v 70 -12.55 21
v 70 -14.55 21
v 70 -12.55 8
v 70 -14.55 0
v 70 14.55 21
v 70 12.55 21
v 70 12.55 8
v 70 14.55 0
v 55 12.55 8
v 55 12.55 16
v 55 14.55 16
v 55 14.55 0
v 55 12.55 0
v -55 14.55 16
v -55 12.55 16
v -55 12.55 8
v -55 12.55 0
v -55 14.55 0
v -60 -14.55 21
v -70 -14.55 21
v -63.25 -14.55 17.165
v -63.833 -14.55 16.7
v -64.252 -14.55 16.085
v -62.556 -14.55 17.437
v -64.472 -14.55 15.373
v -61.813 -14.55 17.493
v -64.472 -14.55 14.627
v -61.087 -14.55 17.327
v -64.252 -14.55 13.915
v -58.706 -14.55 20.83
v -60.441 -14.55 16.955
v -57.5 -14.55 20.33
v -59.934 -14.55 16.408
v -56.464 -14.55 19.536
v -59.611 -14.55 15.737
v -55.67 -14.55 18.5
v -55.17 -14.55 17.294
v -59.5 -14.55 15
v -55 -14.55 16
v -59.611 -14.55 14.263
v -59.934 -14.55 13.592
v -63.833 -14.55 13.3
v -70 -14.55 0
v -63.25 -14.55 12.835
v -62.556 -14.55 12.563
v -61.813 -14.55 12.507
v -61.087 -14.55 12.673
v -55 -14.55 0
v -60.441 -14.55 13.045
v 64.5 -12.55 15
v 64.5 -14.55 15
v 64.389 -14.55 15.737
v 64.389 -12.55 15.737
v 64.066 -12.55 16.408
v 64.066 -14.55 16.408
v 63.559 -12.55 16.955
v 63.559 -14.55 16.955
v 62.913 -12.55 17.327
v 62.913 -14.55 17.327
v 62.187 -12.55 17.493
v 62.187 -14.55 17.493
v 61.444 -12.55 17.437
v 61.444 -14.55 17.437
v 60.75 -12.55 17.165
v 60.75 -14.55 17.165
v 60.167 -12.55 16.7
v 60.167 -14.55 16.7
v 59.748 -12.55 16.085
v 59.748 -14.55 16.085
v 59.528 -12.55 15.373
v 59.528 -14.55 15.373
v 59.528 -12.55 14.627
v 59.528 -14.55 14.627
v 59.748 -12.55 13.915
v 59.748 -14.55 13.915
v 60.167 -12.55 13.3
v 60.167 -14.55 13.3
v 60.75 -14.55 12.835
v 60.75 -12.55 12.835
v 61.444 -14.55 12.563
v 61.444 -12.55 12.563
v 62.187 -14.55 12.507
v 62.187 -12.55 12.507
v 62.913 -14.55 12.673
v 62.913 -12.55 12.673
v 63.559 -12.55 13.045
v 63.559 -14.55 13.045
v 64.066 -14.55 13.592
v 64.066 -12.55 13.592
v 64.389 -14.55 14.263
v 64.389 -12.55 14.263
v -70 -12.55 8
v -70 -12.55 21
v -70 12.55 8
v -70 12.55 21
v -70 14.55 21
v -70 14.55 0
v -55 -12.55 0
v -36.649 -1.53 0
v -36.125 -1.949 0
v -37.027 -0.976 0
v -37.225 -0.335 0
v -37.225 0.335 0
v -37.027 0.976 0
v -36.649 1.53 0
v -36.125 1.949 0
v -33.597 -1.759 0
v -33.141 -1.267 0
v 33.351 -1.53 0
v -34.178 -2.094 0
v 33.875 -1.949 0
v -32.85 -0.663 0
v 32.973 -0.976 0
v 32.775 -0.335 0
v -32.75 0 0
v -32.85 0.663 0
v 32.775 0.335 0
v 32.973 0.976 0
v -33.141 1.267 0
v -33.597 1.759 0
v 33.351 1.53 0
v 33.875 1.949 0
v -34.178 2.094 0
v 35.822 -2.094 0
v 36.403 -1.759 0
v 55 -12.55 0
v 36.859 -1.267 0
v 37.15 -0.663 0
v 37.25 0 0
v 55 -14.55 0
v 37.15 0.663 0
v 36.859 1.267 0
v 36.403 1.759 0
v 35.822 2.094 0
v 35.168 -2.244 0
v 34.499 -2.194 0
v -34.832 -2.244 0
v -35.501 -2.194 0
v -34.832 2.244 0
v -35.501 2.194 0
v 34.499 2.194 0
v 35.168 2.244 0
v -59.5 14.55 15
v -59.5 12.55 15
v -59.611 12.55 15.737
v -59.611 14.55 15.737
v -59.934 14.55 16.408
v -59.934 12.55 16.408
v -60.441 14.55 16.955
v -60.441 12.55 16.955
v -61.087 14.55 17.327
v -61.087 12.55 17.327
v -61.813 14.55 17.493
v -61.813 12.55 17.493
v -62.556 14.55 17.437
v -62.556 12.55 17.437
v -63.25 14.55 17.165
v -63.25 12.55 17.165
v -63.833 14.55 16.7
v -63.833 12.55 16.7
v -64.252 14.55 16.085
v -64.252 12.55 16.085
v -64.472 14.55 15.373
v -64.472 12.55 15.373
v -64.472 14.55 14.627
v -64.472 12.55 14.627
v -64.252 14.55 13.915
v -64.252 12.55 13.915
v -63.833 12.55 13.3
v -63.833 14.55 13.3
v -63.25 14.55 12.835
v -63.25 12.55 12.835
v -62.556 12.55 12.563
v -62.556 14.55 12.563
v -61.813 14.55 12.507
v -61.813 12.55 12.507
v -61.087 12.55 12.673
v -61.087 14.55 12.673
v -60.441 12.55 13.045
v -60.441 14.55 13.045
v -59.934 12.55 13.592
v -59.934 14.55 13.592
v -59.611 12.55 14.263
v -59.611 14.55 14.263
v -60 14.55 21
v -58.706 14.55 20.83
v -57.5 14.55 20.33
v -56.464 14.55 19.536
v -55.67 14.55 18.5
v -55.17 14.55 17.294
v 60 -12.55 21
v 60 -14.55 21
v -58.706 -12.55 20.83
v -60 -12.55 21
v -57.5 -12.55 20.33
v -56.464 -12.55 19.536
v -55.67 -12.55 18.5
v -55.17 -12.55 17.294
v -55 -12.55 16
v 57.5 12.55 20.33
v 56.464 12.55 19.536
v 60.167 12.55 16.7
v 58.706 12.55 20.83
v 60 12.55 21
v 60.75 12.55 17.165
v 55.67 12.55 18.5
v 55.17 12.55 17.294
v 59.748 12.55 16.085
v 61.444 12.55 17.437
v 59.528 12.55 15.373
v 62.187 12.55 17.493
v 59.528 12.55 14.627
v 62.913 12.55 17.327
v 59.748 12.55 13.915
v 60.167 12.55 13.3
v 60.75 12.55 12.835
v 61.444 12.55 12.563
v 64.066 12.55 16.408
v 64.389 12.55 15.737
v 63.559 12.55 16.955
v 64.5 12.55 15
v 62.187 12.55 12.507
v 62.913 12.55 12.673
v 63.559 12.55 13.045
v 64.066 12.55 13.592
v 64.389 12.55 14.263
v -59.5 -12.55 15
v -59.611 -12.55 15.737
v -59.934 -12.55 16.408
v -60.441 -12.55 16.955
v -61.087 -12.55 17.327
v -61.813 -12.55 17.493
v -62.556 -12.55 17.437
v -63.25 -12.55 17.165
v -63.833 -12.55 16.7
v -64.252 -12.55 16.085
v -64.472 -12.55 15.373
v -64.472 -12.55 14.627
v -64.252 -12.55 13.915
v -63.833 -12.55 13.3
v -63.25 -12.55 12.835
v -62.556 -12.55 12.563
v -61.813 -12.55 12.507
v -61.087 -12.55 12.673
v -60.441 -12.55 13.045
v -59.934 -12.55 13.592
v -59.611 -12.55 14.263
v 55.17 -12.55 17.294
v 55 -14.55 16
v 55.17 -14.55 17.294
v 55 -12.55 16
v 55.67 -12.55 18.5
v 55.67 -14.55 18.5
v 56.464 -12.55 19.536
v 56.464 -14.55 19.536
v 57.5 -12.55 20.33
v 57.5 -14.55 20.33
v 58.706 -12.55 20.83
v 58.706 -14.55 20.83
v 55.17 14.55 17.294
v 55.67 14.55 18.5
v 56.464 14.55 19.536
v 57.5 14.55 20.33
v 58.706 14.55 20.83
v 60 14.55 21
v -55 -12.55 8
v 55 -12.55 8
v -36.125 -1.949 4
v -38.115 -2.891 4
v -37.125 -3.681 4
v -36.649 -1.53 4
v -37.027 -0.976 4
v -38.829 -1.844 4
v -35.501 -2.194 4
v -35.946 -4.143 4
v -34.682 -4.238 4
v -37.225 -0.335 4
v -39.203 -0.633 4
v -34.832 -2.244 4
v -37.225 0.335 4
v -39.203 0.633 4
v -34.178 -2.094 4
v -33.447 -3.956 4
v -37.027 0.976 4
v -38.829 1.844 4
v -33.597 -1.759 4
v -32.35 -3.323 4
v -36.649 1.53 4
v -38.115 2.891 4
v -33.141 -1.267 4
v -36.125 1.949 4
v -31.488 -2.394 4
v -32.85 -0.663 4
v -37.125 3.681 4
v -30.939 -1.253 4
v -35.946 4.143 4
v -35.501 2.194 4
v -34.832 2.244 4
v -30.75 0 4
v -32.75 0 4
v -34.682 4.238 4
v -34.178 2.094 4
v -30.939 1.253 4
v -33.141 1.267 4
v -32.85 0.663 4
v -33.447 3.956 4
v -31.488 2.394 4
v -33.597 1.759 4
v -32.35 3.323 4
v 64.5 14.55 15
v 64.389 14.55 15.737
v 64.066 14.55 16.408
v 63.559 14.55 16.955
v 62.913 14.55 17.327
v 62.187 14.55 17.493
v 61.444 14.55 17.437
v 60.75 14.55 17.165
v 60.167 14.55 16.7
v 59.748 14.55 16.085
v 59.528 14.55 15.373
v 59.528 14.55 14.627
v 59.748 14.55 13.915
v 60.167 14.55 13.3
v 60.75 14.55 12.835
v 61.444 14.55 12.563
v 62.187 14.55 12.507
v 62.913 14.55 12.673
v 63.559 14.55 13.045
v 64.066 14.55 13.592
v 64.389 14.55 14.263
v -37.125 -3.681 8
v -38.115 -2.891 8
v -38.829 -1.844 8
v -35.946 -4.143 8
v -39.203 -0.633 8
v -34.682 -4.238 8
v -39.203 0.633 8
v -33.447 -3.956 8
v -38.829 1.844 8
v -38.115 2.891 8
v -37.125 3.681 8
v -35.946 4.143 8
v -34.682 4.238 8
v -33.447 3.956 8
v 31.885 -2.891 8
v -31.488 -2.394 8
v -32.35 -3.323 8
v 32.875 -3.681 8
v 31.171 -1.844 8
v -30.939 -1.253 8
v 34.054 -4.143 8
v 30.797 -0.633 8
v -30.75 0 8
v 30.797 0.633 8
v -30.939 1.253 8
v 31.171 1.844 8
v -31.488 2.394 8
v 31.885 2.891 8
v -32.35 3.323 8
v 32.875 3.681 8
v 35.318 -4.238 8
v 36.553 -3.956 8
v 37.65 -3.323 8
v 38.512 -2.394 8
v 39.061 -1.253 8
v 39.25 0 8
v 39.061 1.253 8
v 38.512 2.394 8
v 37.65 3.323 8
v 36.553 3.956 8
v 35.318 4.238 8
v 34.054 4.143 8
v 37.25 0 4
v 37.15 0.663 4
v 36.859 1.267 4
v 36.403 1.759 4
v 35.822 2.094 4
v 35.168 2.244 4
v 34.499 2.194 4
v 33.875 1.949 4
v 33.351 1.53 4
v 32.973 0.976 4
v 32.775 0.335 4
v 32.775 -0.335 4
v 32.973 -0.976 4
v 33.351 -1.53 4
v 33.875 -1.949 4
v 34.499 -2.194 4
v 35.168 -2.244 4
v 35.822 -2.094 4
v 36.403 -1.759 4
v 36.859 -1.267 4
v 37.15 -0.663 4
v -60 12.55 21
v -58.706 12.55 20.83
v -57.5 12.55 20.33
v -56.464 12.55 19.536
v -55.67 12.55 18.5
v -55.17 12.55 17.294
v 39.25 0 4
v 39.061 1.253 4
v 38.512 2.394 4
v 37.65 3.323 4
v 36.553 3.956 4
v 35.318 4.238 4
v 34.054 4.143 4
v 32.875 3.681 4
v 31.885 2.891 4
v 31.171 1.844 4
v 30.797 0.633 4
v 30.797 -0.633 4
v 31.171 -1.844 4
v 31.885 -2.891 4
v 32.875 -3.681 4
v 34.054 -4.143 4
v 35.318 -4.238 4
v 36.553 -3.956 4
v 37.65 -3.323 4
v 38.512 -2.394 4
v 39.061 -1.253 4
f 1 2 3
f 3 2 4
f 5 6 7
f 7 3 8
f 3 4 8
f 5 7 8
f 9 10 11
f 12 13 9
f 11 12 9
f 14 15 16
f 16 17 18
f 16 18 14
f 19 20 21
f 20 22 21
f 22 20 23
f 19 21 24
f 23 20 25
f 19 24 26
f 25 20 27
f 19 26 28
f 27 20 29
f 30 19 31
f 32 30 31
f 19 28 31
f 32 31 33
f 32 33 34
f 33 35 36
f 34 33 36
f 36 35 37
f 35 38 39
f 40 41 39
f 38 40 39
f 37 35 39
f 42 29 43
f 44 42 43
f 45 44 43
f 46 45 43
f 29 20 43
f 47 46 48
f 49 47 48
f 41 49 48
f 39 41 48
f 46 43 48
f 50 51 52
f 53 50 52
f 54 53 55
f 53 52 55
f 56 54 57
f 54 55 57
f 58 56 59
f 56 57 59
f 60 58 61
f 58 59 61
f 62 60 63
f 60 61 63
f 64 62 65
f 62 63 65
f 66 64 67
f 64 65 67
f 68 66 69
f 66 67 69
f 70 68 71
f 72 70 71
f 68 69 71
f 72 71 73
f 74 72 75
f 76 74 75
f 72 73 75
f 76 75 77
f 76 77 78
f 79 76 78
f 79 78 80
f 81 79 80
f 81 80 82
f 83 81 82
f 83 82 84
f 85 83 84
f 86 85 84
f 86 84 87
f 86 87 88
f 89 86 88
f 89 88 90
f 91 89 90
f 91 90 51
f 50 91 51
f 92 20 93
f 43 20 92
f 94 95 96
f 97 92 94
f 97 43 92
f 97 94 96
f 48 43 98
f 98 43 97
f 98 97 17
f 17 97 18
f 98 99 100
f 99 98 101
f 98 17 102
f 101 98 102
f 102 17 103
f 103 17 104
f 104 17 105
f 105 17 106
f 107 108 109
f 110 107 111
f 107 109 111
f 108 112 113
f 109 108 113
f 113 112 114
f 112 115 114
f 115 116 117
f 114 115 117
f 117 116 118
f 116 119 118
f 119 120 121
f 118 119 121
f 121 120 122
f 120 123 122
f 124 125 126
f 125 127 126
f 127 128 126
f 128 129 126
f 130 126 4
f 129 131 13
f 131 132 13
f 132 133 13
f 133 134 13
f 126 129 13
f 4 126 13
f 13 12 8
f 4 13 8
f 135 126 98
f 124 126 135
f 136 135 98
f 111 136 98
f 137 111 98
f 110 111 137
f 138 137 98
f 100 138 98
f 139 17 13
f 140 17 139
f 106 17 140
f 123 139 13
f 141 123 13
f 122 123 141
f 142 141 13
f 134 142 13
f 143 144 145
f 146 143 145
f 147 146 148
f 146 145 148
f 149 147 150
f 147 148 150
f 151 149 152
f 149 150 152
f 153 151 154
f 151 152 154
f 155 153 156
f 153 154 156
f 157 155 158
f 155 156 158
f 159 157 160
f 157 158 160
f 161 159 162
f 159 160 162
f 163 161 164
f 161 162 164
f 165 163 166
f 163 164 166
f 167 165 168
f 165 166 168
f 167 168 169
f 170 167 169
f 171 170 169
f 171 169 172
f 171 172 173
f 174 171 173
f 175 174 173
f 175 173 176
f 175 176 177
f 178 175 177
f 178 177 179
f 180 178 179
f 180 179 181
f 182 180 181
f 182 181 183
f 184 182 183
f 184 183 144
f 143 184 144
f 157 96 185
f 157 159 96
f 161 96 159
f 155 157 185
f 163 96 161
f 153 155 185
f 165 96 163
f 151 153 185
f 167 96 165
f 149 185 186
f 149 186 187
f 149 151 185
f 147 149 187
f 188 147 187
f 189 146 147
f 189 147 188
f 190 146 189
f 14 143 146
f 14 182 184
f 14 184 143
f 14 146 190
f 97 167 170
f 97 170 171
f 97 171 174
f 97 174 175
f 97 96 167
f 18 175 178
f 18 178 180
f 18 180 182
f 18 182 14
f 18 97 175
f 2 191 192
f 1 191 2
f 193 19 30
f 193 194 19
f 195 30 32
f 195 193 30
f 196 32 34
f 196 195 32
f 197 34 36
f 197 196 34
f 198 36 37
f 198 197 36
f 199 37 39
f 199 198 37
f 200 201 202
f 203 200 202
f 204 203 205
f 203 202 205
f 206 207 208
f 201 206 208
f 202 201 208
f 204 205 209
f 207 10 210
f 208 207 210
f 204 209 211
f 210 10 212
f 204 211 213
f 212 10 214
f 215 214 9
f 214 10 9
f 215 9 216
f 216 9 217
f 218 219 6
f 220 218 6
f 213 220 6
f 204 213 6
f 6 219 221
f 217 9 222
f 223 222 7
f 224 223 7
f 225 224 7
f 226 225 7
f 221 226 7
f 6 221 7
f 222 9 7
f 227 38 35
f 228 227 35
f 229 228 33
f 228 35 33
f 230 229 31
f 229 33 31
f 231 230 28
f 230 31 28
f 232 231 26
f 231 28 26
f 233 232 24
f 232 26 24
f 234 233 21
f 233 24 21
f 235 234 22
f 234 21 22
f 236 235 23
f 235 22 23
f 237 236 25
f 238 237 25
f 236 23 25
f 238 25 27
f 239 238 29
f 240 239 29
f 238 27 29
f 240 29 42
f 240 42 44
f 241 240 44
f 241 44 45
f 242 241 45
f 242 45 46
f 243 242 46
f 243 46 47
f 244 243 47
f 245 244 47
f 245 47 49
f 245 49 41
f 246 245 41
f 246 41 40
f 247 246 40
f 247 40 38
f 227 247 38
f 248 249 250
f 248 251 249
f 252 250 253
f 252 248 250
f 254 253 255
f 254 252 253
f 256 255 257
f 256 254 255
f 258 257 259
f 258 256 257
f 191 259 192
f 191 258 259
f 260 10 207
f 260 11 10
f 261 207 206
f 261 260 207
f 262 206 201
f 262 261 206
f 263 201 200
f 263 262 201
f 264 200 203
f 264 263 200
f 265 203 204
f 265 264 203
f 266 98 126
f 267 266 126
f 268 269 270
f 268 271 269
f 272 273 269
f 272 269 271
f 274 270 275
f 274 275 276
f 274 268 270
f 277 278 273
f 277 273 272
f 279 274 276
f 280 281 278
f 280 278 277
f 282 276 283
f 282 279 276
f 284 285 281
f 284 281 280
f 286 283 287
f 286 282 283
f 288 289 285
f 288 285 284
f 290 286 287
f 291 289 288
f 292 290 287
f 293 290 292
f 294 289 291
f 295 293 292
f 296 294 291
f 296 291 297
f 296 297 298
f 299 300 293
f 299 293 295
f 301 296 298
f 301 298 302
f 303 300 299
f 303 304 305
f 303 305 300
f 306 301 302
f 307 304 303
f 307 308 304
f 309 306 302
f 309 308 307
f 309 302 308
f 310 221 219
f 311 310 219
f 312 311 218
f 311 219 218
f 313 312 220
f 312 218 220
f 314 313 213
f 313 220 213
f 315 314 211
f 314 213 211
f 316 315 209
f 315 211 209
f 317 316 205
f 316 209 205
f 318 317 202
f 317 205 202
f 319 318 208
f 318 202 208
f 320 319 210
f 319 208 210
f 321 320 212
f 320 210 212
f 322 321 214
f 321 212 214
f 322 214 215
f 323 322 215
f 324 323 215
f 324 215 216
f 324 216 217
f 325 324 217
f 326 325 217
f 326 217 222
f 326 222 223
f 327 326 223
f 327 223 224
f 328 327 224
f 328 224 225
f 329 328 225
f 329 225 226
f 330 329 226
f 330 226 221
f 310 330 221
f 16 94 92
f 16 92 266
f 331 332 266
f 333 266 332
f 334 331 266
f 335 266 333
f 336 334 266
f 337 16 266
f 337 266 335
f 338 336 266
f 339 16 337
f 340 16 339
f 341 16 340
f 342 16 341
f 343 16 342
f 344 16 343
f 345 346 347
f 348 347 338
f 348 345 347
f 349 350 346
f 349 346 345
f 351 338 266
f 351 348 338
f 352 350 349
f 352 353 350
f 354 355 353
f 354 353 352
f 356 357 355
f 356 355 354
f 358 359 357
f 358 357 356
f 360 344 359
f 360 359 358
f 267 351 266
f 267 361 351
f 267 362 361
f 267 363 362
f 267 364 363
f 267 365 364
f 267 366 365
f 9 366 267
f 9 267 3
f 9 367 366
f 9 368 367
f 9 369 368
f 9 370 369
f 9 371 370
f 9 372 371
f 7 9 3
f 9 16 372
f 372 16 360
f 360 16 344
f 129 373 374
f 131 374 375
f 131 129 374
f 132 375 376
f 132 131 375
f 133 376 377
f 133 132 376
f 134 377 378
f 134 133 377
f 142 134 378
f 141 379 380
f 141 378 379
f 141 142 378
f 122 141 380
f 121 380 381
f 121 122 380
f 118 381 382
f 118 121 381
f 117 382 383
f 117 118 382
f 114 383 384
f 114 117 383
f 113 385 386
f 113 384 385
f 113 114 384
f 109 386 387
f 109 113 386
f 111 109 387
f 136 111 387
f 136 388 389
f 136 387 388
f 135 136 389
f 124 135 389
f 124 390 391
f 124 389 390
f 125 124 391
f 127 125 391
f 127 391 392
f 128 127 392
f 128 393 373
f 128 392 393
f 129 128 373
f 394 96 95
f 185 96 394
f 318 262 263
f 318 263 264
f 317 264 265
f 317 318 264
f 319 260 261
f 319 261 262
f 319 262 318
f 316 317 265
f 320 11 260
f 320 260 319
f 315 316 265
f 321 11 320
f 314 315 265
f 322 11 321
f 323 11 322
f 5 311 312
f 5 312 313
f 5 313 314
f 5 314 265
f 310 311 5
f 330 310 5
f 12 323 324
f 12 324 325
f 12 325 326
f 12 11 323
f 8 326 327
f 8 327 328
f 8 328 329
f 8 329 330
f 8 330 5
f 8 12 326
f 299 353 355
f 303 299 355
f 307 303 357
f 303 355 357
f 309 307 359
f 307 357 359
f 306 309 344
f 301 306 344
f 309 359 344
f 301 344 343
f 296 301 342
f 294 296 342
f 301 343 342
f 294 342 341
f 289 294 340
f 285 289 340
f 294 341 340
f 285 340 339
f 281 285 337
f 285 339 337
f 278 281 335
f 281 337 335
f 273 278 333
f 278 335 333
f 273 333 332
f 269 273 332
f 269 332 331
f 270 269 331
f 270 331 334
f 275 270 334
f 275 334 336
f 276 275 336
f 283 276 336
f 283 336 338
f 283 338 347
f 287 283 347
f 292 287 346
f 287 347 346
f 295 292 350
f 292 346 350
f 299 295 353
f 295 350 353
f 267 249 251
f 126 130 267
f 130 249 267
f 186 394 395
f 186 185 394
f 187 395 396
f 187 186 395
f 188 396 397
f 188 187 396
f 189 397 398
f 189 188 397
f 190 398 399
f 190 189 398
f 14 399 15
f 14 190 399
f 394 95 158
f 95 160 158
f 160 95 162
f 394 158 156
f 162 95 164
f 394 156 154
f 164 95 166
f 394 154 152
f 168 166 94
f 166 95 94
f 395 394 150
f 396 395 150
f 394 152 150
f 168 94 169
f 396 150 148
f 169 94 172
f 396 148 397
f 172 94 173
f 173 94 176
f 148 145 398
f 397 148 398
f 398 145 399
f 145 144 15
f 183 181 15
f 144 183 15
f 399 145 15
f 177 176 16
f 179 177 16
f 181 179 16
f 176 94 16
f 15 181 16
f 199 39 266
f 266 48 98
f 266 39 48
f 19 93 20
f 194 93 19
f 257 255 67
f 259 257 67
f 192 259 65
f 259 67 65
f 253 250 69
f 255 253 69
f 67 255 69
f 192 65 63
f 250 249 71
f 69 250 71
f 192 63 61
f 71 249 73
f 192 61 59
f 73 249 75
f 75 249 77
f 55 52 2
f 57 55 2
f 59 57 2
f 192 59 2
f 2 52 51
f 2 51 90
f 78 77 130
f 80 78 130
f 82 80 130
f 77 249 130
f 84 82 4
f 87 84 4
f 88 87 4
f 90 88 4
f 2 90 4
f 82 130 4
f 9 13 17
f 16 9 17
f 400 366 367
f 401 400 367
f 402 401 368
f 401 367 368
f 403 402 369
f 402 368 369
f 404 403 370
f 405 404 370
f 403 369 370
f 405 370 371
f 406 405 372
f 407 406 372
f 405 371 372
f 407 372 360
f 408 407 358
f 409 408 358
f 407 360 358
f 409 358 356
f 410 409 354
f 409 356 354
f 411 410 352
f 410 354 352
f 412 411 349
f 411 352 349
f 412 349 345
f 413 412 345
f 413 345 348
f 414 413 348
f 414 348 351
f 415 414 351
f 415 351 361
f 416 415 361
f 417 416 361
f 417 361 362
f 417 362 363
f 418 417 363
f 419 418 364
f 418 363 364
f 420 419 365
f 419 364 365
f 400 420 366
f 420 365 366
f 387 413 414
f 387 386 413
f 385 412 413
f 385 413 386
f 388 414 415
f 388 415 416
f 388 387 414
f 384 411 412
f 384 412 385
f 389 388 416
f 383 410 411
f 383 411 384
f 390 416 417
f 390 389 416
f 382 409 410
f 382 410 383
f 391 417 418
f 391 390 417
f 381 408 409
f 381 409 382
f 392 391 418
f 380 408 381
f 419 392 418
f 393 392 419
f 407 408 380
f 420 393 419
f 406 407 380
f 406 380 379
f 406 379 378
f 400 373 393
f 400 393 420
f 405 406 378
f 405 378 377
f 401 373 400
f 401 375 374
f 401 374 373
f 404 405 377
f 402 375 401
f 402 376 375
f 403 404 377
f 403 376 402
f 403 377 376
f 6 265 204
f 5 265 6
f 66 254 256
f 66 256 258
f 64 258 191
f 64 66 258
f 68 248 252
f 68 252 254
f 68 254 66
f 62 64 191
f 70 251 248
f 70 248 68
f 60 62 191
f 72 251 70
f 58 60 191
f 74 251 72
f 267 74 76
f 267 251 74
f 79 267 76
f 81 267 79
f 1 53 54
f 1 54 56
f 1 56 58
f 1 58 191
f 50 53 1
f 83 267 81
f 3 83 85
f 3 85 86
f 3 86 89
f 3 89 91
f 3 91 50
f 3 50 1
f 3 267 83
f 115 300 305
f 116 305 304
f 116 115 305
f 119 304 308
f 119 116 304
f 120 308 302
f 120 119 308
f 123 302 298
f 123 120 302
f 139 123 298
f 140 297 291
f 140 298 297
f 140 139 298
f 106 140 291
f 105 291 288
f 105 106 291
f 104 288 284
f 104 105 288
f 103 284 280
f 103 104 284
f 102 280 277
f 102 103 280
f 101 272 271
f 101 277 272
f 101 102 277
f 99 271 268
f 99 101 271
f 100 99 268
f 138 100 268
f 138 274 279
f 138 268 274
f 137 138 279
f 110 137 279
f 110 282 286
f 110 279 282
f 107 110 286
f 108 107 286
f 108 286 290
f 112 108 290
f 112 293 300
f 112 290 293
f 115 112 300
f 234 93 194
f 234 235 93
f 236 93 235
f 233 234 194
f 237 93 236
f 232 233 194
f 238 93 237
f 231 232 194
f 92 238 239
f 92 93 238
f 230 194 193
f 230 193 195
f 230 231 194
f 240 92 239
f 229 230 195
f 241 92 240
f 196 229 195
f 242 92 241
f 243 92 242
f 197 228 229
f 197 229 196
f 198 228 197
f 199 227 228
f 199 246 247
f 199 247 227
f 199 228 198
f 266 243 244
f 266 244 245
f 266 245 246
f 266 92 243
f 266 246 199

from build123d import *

# Parameters (mm, degrees)
F0_R     = 4.25
F0_R_2   = 2.25
F1_DEPTH = 8
F0_W     = 15
F0_H     = 2
F2_DEPTH = 21
F3_R     = 2.5
F4_DEPTH = 29.101
F5_R     = 5
F6_R     = 4.25
F7_DEPTH = 4


# Not quite as in the source:
# - a feature names something its author has since deleted; it is built from what else it names


with BuildPart() as f1:
    # F0 (on Top) → F1 (new body)
    with BuildSketch(Plane.XY):
        Polygon((55, -12.55), (70, -12.55), (70, 12.55), (55, 12.55), (-55, 12.55), (-70, 12.55), (-70, -12.55), (-55, -12.55), align=None)
        with Locations((-35, 0)):
            Circle(F0_R, mode=Mode.SUBTRACT)
        with Locations((35, 0)):
            Circle(F0_R, mode=Mode.SUBTRACT)
        with Locations((-35, 0)):
            Circle(F0_R)
        with Locations((-35, 0)):
            Circle(F0_R_2, mode=Mode.SUBTRACT)
        with Locations((35, 0)):
            Circle(F0_R)
        with Locations((35, 0)):
            Circle(F0_R_2, mode=Mode.SUBTRACT)
    extrude(amount=F1_DEPTH)

    # F0 (on Top) → F2 (join)
    with BuildSketch(Plane.XY):
        with Locations((-62.5, -13.55)):
            Rectangle(F0_W, F0_H)
        with Locations((62.5, -13.55)):
            Rectangle(F0_W, F0_H)
        with Locations((-62.5, 13.55)):
            Rectangle(F0_W, F0_H)
        with Locations((62.5, 13.55)):
            Rectangle(F0_W, F0_H)
    extrude(amount=F2_DEPTH)

    # F3 (on face) → F4 (cut, through all)
    with BuildSketch(Plane.XZ.offset(14.55)):
        with Locations((-62, 15)):
            Circle(F3_R)
        with Locations((62, 15)):
            Circle(F3_R)
    extrude(amount=-F4_DEPTH, mode=Mode.SUBTRACT)

    # F5
    f5_edges = [f1.edges().sort_by_distance(p)[0] for p in [
        (-55, -13.55, 21),
        (55, -13.55, 21),
        (-55, 13.55, 21),
        (55, 13.55, 21),
    ]]
    fillet(f5_edges, radius=F5_R)

    # F6 (on face) → F7 (cut)
    with BuildSketch(Plane.XY.offset(8)):
        with Locations((-35, 0)):
            Circle(F6_R)
        with Locations((35, 0)):
            Circle(F6_R)
    extrude(amount=-F7_DEPTH, mode=Mode.SUBTRACT)


solid = f1.part
